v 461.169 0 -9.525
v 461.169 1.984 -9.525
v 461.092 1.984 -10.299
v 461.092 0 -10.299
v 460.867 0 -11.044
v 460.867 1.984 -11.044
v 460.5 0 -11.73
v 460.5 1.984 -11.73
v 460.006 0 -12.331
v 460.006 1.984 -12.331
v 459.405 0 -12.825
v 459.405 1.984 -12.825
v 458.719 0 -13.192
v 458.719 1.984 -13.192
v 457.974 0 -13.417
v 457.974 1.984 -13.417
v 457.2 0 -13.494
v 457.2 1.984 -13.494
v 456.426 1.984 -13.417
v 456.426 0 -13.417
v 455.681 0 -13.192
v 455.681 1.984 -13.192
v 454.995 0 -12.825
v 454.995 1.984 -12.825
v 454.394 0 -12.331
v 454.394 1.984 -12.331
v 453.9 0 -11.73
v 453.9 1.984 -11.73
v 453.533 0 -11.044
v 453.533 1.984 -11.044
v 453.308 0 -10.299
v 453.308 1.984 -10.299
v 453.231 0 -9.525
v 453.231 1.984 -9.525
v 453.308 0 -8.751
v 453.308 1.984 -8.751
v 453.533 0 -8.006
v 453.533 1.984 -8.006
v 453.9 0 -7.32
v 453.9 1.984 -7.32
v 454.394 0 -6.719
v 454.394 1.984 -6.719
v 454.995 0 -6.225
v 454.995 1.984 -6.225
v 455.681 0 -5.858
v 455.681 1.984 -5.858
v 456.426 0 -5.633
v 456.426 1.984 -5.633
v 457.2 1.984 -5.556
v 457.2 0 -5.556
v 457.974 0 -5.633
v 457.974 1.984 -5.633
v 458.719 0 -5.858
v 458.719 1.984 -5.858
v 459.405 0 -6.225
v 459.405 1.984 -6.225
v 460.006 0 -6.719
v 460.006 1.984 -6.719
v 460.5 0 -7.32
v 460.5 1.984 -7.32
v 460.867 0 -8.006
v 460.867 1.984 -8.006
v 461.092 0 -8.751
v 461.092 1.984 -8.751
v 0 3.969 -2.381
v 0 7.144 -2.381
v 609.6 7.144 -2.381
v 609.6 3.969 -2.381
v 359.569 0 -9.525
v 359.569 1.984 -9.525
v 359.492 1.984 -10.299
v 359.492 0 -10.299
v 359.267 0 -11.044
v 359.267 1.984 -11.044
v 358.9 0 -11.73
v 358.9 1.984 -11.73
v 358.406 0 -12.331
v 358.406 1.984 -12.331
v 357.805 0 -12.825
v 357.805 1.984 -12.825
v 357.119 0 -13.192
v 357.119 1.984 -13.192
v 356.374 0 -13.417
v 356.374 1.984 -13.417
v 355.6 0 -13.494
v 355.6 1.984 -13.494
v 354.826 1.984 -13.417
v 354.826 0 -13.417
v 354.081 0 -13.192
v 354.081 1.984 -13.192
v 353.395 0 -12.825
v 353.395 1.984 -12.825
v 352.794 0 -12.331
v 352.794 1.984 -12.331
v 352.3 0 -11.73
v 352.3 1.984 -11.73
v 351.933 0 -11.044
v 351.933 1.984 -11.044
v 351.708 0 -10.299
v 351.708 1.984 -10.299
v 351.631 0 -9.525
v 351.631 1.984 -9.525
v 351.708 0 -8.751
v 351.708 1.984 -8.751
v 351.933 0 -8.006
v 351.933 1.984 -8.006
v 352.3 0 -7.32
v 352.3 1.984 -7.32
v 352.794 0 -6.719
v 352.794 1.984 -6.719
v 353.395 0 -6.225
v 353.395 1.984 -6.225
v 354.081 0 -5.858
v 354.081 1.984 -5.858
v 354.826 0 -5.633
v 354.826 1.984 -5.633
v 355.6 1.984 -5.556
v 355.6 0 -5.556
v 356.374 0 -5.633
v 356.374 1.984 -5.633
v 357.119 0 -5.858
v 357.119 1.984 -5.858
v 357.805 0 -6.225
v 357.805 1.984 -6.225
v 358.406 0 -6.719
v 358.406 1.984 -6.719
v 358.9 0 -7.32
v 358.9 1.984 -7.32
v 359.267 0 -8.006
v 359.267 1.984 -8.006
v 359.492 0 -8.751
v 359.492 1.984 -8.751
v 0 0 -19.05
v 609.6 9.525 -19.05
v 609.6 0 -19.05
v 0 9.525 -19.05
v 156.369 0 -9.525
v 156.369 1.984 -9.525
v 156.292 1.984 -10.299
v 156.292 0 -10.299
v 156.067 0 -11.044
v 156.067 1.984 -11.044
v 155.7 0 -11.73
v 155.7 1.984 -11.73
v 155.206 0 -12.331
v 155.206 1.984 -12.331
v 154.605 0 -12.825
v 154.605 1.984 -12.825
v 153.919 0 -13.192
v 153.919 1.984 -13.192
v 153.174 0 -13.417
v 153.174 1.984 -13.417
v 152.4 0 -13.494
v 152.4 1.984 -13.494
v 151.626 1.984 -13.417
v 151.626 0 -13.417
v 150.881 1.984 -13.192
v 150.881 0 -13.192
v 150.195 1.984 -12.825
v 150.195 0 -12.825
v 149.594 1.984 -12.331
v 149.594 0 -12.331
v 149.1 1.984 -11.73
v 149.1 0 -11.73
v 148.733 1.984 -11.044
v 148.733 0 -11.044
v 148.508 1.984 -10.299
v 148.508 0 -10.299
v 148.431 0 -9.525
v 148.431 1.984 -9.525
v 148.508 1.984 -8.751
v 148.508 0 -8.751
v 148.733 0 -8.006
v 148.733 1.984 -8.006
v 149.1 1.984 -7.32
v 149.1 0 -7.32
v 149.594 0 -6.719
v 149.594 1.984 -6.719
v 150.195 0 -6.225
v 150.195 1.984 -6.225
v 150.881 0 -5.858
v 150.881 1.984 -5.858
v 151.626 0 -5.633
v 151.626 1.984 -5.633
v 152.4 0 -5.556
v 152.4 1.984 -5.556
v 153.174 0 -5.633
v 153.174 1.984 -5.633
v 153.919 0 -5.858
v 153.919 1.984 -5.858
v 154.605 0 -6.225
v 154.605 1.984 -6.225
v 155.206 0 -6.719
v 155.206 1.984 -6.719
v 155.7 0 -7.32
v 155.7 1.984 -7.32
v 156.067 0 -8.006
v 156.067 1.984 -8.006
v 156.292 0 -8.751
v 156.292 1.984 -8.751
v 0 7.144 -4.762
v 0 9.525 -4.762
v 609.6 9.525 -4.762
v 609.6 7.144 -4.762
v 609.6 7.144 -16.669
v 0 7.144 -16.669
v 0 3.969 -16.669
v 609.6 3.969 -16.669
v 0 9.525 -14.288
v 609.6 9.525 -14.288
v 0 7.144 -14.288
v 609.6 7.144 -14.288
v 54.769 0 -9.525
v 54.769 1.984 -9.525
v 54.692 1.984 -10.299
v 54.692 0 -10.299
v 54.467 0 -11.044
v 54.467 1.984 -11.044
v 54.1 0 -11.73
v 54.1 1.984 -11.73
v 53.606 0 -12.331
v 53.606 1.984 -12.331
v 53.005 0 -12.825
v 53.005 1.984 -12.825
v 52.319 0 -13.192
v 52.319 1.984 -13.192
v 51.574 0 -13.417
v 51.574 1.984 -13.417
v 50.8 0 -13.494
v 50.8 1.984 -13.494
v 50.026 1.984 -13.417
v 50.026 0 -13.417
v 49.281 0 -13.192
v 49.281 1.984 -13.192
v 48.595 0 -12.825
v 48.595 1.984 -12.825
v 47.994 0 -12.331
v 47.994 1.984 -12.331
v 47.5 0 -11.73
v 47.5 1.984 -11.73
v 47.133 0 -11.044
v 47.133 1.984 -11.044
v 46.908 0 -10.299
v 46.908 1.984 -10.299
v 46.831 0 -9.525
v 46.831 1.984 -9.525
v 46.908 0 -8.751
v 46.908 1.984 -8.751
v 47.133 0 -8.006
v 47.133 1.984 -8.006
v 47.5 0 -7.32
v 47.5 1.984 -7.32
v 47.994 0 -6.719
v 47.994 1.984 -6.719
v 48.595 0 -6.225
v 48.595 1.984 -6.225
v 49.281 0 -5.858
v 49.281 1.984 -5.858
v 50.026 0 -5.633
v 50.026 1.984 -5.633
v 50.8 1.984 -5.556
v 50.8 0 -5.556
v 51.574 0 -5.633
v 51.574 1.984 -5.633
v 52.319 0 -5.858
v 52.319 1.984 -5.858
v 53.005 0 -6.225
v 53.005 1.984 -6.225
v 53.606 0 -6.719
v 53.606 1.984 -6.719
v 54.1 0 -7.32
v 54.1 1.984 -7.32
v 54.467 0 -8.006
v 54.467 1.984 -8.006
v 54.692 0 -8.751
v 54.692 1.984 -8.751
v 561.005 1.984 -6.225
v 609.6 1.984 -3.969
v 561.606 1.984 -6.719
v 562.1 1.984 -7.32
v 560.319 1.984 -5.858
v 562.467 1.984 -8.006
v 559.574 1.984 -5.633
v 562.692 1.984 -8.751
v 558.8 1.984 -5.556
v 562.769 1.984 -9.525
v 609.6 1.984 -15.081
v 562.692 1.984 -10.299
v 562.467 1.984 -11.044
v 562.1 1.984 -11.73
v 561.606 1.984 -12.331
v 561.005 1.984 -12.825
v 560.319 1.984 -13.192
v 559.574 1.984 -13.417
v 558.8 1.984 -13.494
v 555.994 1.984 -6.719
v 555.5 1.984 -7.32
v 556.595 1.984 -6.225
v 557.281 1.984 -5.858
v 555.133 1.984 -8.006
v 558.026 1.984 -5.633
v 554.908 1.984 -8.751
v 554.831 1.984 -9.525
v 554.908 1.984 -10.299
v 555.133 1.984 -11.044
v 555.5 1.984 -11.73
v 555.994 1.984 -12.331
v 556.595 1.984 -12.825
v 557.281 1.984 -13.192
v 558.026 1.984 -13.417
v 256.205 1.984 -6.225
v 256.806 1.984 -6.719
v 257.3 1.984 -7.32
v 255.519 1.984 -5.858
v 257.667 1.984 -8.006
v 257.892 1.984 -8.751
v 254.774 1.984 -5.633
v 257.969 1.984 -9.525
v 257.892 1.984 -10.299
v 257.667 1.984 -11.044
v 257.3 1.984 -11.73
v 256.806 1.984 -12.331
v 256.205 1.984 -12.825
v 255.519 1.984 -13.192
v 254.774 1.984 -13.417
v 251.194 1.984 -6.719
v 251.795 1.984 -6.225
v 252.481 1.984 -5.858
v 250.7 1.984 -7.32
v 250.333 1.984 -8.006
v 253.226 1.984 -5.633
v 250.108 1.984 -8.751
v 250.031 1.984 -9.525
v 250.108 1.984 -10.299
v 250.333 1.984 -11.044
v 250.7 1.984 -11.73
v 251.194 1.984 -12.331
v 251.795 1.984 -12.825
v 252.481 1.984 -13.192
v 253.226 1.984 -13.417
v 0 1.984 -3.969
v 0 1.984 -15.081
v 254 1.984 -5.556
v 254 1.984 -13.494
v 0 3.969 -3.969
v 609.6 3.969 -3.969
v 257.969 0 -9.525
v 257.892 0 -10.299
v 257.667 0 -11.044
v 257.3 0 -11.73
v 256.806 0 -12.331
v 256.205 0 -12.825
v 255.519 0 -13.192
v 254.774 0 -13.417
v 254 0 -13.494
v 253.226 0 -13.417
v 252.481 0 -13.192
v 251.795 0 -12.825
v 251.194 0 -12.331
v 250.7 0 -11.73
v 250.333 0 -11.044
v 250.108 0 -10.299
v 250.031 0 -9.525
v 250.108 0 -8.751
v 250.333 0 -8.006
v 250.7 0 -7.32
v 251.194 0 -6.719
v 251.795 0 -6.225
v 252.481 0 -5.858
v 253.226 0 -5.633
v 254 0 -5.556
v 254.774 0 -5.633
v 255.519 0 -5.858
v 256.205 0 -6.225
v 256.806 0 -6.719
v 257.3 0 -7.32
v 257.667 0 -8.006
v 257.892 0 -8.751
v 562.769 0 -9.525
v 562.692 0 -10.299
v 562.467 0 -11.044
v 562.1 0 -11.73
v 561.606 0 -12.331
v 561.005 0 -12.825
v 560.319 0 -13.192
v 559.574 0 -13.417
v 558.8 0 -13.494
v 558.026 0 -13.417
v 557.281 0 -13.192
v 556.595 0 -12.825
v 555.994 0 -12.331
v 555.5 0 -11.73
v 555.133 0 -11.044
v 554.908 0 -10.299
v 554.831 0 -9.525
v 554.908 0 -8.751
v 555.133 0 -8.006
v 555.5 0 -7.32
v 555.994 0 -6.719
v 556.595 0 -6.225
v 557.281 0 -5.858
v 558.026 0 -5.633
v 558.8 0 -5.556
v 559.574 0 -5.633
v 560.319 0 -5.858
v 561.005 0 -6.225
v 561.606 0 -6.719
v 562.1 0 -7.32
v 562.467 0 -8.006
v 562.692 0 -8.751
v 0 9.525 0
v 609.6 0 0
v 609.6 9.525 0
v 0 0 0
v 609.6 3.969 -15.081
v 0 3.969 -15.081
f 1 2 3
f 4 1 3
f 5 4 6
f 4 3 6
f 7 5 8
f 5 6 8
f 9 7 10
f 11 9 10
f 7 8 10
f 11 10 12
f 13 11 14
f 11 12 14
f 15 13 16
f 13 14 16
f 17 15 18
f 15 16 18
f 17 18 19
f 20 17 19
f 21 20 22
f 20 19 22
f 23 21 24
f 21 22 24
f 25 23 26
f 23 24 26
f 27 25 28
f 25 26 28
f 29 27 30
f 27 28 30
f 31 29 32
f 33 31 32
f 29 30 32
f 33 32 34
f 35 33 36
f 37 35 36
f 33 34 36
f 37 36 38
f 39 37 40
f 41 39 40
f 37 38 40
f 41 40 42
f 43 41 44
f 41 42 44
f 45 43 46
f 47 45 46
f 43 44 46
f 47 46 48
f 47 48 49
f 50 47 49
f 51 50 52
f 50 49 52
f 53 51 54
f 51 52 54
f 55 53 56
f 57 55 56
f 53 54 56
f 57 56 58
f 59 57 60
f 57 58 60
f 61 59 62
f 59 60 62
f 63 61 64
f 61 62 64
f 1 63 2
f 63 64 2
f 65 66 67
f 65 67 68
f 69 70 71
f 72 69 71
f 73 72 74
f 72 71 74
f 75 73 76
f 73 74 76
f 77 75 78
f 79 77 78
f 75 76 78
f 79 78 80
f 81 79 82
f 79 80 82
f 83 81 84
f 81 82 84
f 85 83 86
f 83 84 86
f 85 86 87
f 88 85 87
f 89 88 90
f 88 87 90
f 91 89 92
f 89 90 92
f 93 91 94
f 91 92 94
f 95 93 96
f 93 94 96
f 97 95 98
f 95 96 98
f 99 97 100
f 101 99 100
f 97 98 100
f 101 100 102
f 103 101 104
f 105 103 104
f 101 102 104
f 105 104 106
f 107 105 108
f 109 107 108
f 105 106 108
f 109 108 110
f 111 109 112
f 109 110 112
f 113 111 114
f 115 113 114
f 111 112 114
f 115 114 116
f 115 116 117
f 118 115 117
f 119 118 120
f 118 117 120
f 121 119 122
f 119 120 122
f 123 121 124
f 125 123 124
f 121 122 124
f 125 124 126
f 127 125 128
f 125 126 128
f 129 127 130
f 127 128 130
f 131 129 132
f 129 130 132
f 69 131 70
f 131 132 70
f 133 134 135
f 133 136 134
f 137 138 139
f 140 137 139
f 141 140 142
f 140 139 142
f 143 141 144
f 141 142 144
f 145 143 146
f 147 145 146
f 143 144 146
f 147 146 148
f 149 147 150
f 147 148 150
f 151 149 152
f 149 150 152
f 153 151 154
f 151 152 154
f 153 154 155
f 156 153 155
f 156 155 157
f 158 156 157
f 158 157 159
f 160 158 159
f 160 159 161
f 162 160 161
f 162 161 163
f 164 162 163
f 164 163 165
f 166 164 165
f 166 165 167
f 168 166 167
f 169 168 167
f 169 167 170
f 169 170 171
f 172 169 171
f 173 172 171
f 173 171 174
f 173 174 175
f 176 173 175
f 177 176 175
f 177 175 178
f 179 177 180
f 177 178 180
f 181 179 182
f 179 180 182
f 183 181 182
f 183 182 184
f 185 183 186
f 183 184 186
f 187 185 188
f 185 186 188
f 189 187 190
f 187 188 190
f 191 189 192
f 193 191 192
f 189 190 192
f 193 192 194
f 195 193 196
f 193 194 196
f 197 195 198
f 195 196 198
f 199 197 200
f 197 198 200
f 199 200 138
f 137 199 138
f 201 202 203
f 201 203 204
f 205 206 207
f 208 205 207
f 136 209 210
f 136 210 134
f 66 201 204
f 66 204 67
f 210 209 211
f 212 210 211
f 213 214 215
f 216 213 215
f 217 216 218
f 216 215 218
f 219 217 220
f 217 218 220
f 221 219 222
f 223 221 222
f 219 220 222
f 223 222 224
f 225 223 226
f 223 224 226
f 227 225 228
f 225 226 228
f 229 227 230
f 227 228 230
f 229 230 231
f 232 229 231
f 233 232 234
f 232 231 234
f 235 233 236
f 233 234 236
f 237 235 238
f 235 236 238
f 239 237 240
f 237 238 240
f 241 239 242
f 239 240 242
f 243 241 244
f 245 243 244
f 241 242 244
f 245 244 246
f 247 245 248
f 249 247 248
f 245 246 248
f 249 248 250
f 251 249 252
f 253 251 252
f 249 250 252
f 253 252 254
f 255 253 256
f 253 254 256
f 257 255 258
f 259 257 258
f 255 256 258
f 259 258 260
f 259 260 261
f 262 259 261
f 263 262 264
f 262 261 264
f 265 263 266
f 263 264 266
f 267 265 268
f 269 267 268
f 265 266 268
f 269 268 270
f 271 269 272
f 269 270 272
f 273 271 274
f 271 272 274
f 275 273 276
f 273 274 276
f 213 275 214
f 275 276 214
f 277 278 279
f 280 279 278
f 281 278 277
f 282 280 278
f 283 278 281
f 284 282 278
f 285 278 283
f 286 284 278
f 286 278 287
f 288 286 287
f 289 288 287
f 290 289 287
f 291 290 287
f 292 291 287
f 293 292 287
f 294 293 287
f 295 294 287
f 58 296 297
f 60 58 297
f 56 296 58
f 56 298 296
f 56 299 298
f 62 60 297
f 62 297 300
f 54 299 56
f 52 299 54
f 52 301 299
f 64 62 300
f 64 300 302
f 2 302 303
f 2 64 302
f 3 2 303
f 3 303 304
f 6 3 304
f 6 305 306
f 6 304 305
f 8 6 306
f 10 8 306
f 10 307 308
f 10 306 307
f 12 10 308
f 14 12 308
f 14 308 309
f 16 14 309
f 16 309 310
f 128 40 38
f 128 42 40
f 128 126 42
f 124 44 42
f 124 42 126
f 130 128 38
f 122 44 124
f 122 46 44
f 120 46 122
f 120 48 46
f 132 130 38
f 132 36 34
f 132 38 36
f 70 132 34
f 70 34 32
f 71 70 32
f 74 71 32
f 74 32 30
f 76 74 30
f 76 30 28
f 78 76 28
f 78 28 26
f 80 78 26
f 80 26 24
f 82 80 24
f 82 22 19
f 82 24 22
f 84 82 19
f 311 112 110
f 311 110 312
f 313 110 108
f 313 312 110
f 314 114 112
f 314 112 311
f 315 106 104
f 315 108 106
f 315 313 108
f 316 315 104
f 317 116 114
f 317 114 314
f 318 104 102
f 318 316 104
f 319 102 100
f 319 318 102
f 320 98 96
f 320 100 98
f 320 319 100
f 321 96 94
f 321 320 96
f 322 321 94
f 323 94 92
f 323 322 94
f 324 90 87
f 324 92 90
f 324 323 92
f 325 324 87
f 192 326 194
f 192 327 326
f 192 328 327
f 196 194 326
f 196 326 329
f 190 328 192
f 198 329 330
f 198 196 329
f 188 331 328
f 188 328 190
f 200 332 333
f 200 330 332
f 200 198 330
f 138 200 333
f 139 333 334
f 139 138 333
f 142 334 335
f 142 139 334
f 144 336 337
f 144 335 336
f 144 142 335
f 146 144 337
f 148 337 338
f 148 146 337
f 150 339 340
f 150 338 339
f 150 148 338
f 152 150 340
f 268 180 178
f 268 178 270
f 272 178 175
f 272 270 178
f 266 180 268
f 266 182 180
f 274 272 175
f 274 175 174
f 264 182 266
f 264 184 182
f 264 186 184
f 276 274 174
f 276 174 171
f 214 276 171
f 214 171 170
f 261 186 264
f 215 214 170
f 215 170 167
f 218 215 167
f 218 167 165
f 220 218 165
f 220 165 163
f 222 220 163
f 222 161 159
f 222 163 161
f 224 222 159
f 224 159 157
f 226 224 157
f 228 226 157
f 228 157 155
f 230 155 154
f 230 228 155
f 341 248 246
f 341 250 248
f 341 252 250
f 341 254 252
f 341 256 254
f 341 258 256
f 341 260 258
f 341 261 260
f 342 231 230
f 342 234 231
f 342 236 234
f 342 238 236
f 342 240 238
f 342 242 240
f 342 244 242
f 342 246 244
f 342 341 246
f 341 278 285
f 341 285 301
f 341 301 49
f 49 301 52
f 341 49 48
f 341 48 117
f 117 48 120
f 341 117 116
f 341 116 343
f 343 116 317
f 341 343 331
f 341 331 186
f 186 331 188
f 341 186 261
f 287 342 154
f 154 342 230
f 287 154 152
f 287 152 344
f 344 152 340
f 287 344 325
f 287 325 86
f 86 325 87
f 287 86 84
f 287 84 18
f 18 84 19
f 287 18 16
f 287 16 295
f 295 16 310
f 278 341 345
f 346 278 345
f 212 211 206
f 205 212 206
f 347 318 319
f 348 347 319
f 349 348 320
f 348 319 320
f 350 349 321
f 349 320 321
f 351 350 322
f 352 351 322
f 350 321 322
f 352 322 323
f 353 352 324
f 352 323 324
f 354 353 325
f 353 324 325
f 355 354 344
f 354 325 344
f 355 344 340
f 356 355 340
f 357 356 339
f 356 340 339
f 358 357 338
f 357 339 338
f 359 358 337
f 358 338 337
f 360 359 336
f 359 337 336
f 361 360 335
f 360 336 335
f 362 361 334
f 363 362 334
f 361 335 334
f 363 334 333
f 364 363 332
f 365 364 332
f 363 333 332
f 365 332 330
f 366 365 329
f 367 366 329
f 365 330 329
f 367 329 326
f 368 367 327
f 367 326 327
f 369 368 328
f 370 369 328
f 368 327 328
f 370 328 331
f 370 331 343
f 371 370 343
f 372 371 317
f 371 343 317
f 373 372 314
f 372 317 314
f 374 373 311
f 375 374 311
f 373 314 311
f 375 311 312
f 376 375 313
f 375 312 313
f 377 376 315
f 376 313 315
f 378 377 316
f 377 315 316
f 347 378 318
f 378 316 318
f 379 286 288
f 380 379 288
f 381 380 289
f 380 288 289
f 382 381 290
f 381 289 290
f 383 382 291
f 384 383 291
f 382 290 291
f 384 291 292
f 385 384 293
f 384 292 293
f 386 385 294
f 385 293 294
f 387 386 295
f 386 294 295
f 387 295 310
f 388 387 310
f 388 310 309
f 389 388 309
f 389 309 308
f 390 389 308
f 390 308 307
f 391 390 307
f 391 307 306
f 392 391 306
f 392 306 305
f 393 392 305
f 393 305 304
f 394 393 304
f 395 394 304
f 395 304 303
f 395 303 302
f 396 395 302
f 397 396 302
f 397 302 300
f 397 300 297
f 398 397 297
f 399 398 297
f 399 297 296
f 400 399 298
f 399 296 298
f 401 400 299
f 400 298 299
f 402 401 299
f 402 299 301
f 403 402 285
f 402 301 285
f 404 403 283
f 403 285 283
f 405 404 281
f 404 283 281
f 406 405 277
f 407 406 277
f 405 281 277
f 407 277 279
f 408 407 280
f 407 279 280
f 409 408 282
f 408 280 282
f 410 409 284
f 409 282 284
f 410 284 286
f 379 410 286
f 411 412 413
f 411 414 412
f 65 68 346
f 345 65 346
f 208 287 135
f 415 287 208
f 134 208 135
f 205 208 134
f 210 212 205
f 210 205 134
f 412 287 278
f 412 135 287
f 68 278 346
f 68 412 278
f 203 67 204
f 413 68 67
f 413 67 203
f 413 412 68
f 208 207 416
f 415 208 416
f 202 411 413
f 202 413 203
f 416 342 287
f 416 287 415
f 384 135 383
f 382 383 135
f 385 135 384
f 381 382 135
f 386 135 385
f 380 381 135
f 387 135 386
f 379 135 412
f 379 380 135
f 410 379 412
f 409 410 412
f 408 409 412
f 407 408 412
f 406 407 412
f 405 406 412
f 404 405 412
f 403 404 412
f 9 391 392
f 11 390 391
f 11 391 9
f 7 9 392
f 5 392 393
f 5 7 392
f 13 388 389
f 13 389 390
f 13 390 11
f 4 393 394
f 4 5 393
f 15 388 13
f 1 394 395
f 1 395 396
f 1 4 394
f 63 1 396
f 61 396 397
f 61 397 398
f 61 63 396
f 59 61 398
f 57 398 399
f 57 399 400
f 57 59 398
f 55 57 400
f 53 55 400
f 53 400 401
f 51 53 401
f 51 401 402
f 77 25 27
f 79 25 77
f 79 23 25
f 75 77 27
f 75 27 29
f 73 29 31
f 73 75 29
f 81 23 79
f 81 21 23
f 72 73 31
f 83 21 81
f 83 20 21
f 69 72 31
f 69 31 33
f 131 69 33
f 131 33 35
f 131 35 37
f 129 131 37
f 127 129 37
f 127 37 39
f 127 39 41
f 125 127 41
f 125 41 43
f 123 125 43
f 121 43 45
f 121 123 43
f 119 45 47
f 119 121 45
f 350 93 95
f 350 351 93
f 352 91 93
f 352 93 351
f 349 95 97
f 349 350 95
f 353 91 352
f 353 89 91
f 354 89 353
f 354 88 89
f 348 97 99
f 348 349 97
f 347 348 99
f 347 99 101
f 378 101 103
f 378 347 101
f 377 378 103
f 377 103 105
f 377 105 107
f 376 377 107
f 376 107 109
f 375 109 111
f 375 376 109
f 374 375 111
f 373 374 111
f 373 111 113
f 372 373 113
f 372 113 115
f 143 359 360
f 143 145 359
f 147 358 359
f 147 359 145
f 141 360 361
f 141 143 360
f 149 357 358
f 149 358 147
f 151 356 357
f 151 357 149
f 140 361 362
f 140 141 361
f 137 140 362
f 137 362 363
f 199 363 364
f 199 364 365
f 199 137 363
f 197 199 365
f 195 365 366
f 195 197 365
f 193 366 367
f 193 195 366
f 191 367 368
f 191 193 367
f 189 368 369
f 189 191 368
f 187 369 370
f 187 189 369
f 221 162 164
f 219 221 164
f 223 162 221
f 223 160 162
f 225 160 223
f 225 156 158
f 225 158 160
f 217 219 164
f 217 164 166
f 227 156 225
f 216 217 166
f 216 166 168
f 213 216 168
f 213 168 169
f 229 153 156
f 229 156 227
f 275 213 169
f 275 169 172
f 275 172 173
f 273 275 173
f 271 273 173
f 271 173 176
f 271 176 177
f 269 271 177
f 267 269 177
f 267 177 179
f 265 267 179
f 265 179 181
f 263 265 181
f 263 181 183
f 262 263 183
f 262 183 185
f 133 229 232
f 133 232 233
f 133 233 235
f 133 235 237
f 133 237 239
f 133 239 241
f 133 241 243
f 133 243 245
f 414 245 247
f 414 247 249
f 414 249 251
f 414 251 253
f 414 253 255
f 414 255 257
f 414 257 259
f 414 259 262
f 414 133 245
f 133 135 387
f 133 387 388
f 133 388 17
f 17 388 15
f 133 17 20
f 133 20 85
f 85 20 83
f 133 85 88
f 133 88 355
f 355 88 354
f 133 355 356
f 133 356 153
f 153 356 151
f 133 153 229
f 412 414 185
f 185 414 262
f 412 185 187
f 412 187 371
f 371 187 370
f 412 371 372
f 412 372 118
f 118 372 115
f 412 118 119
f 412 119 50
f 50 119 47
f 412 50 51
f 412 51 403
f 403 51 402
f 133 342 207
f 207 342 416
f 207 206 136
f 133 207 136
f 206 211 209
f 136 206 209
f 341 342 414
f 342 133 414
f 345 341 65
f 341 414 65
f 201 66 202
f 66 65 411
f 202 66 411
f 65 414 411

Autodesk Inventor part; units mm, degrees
ref_plane "YZ Plane" through (0, 0, 0) normal (1, 0, 0) x (0, 1, 0)
ref_plane "XZ Plane" through (0, 0, 0) normal (0, 1, 0) x (-1, 0, 0)
ref_plane "XY Plane" through (0, 0, 0) normal (0, 0, 1) x (1, 0, 0)
sketch "Sketch1" plane through (0, 0, 0) normal (1, 0, 0) x (0, 1, 0)
  line L0 (0, 0) -> (9.525, 0)
  line L1 (9.525, 0) -> (9.525, -19.05)
  line L2 (9.525, -19.05) -> (0, -19.05)
  line L3 (0, -19.05) -> (0, 0)
  line L4 (0, 0) -> (7.1437, 0)
  line L5 (7.1437, 0) -> (7.1437, -19.05) construction
  line L6 (0, 0) -> (3.9688, 0) construction
  line L7 (3.9688, 0) -> (3.9688, -19.231) construction
  line L8 (9.525, -9.525) -> (9.525, -2.3813) construction
  line L9 (9.525, -9.525) -> (9.525, -4.7625)
  line L10 (9.525, -4.7625) -> (7.1437, -4.7625)
  line L11 (7.1437, -4.7625) -> (7.1437, -2.3813)
  line L12 (9.525, -9.525) -> (12.141, -9.525)
  line L13 (7.1437, -2.3813) -> (3.9688, -2.3813)
  line L14 (9.525, -9.525) -> (9.525, -3.9688)
  line L15 (9.525, -3.9688) -> (0, -3.9687) construction
  line L16 (3.9688, -2.3813) -> (3.9688, -3.9687)
  line L17 (1.9844, -3.9687) -> (3.9688, -3.9687)
  line L18 (1.9844, -3.9687) -> (1.9844, -9.525)
  line L19 (9.525, -14.2875) -> (7.1437, -14.2875)
  line L20 (7.1437, -14.2875) -> (7.1437, -16.6687)
  line L21 (7.1437, -16.6687) -> (3.9688, -16.6687)
  line L22 (3.9688, -16.6687) -> (3.9688, -15.0813)
  line L23 (1.9844, -15.0813) -> (3.9688, -15.0813)
  line L24 (1.9844, -15.0813) -> (1.9844, -9.525)
  dimension "d20" = 9.525
  dimension "d21" = 19.05
  dimension "d22" = 7.1437
  dimension "d23" = 3.9688
  dimension "d24" = 7.1437
  dimension "d25" = 4.7625
  dimension "d26" = 5.5563
extrude "Extrusion1" add sketch "Sketch1" along normal blind 609.6 contours L0 L1 L10 L11 L13 L16 L17 L18 L24 L23 L22 L21 L20 L19 L2 L3
sketch "Sketch2" plane through (0, 1.9844, -3.9687) normal (0, 1, 0) x (1, 0, 0)
  line L0 (0, 11.1125) -> (0, 0) projected
  line L1 (0, 0) -> (609.6, 0) projected
  line L2 (609.6, 11.1125) -> (609.6, 0) projected
  line L3 (0, 11.1125) -> (609.6, 11.1125) projected
  line L4 (0, 5.5563) -> (50.8, 5.5563)
  line L5 (50.8, 5.5563) -> (152.4, 5.5563)
  line L6 (152.4, 5.5563) -> (50.8, 5.5563)
  line L7 (50.8, 5.5563) -> (254, 5.5563)
  circle A0 centre (50.8, 5.5563) radius 3.9687
  circle A1 centre (152.4, 5.5563) radius 3.9687
  circle A2 centre (254, 5.5563) radius 3.9687
  line L8 (304.8, 0) -> (304.8, 17.8436)
  circle A3 centre (558.8, 5.5563) radius 3.9687
  circle A4 centre (457.2, 5.5563) radius 3.9687
  circle A5 centre (355.6, 5.5563) radius 3.9687
  point P0 (0, -3.9687)
  dimension "d27" = 50.8
  dimension "d28" = 101.6
  dimension "d29" = 101.6
  dimension "d30" = 203.2
  dimension "d31" = 7.9375
  dimension "d32" = 7.9375
  dimension "d33" = 7.9375
extrude "Extrusion2" cut sketch "Sketch2" against normal through all contours A2 | A1 L7 L5 | L5 L7 A1 | A0 L5 L4 | L4 L5 A0 | A3 | A4 | A5
properties part number "C-Channel"
